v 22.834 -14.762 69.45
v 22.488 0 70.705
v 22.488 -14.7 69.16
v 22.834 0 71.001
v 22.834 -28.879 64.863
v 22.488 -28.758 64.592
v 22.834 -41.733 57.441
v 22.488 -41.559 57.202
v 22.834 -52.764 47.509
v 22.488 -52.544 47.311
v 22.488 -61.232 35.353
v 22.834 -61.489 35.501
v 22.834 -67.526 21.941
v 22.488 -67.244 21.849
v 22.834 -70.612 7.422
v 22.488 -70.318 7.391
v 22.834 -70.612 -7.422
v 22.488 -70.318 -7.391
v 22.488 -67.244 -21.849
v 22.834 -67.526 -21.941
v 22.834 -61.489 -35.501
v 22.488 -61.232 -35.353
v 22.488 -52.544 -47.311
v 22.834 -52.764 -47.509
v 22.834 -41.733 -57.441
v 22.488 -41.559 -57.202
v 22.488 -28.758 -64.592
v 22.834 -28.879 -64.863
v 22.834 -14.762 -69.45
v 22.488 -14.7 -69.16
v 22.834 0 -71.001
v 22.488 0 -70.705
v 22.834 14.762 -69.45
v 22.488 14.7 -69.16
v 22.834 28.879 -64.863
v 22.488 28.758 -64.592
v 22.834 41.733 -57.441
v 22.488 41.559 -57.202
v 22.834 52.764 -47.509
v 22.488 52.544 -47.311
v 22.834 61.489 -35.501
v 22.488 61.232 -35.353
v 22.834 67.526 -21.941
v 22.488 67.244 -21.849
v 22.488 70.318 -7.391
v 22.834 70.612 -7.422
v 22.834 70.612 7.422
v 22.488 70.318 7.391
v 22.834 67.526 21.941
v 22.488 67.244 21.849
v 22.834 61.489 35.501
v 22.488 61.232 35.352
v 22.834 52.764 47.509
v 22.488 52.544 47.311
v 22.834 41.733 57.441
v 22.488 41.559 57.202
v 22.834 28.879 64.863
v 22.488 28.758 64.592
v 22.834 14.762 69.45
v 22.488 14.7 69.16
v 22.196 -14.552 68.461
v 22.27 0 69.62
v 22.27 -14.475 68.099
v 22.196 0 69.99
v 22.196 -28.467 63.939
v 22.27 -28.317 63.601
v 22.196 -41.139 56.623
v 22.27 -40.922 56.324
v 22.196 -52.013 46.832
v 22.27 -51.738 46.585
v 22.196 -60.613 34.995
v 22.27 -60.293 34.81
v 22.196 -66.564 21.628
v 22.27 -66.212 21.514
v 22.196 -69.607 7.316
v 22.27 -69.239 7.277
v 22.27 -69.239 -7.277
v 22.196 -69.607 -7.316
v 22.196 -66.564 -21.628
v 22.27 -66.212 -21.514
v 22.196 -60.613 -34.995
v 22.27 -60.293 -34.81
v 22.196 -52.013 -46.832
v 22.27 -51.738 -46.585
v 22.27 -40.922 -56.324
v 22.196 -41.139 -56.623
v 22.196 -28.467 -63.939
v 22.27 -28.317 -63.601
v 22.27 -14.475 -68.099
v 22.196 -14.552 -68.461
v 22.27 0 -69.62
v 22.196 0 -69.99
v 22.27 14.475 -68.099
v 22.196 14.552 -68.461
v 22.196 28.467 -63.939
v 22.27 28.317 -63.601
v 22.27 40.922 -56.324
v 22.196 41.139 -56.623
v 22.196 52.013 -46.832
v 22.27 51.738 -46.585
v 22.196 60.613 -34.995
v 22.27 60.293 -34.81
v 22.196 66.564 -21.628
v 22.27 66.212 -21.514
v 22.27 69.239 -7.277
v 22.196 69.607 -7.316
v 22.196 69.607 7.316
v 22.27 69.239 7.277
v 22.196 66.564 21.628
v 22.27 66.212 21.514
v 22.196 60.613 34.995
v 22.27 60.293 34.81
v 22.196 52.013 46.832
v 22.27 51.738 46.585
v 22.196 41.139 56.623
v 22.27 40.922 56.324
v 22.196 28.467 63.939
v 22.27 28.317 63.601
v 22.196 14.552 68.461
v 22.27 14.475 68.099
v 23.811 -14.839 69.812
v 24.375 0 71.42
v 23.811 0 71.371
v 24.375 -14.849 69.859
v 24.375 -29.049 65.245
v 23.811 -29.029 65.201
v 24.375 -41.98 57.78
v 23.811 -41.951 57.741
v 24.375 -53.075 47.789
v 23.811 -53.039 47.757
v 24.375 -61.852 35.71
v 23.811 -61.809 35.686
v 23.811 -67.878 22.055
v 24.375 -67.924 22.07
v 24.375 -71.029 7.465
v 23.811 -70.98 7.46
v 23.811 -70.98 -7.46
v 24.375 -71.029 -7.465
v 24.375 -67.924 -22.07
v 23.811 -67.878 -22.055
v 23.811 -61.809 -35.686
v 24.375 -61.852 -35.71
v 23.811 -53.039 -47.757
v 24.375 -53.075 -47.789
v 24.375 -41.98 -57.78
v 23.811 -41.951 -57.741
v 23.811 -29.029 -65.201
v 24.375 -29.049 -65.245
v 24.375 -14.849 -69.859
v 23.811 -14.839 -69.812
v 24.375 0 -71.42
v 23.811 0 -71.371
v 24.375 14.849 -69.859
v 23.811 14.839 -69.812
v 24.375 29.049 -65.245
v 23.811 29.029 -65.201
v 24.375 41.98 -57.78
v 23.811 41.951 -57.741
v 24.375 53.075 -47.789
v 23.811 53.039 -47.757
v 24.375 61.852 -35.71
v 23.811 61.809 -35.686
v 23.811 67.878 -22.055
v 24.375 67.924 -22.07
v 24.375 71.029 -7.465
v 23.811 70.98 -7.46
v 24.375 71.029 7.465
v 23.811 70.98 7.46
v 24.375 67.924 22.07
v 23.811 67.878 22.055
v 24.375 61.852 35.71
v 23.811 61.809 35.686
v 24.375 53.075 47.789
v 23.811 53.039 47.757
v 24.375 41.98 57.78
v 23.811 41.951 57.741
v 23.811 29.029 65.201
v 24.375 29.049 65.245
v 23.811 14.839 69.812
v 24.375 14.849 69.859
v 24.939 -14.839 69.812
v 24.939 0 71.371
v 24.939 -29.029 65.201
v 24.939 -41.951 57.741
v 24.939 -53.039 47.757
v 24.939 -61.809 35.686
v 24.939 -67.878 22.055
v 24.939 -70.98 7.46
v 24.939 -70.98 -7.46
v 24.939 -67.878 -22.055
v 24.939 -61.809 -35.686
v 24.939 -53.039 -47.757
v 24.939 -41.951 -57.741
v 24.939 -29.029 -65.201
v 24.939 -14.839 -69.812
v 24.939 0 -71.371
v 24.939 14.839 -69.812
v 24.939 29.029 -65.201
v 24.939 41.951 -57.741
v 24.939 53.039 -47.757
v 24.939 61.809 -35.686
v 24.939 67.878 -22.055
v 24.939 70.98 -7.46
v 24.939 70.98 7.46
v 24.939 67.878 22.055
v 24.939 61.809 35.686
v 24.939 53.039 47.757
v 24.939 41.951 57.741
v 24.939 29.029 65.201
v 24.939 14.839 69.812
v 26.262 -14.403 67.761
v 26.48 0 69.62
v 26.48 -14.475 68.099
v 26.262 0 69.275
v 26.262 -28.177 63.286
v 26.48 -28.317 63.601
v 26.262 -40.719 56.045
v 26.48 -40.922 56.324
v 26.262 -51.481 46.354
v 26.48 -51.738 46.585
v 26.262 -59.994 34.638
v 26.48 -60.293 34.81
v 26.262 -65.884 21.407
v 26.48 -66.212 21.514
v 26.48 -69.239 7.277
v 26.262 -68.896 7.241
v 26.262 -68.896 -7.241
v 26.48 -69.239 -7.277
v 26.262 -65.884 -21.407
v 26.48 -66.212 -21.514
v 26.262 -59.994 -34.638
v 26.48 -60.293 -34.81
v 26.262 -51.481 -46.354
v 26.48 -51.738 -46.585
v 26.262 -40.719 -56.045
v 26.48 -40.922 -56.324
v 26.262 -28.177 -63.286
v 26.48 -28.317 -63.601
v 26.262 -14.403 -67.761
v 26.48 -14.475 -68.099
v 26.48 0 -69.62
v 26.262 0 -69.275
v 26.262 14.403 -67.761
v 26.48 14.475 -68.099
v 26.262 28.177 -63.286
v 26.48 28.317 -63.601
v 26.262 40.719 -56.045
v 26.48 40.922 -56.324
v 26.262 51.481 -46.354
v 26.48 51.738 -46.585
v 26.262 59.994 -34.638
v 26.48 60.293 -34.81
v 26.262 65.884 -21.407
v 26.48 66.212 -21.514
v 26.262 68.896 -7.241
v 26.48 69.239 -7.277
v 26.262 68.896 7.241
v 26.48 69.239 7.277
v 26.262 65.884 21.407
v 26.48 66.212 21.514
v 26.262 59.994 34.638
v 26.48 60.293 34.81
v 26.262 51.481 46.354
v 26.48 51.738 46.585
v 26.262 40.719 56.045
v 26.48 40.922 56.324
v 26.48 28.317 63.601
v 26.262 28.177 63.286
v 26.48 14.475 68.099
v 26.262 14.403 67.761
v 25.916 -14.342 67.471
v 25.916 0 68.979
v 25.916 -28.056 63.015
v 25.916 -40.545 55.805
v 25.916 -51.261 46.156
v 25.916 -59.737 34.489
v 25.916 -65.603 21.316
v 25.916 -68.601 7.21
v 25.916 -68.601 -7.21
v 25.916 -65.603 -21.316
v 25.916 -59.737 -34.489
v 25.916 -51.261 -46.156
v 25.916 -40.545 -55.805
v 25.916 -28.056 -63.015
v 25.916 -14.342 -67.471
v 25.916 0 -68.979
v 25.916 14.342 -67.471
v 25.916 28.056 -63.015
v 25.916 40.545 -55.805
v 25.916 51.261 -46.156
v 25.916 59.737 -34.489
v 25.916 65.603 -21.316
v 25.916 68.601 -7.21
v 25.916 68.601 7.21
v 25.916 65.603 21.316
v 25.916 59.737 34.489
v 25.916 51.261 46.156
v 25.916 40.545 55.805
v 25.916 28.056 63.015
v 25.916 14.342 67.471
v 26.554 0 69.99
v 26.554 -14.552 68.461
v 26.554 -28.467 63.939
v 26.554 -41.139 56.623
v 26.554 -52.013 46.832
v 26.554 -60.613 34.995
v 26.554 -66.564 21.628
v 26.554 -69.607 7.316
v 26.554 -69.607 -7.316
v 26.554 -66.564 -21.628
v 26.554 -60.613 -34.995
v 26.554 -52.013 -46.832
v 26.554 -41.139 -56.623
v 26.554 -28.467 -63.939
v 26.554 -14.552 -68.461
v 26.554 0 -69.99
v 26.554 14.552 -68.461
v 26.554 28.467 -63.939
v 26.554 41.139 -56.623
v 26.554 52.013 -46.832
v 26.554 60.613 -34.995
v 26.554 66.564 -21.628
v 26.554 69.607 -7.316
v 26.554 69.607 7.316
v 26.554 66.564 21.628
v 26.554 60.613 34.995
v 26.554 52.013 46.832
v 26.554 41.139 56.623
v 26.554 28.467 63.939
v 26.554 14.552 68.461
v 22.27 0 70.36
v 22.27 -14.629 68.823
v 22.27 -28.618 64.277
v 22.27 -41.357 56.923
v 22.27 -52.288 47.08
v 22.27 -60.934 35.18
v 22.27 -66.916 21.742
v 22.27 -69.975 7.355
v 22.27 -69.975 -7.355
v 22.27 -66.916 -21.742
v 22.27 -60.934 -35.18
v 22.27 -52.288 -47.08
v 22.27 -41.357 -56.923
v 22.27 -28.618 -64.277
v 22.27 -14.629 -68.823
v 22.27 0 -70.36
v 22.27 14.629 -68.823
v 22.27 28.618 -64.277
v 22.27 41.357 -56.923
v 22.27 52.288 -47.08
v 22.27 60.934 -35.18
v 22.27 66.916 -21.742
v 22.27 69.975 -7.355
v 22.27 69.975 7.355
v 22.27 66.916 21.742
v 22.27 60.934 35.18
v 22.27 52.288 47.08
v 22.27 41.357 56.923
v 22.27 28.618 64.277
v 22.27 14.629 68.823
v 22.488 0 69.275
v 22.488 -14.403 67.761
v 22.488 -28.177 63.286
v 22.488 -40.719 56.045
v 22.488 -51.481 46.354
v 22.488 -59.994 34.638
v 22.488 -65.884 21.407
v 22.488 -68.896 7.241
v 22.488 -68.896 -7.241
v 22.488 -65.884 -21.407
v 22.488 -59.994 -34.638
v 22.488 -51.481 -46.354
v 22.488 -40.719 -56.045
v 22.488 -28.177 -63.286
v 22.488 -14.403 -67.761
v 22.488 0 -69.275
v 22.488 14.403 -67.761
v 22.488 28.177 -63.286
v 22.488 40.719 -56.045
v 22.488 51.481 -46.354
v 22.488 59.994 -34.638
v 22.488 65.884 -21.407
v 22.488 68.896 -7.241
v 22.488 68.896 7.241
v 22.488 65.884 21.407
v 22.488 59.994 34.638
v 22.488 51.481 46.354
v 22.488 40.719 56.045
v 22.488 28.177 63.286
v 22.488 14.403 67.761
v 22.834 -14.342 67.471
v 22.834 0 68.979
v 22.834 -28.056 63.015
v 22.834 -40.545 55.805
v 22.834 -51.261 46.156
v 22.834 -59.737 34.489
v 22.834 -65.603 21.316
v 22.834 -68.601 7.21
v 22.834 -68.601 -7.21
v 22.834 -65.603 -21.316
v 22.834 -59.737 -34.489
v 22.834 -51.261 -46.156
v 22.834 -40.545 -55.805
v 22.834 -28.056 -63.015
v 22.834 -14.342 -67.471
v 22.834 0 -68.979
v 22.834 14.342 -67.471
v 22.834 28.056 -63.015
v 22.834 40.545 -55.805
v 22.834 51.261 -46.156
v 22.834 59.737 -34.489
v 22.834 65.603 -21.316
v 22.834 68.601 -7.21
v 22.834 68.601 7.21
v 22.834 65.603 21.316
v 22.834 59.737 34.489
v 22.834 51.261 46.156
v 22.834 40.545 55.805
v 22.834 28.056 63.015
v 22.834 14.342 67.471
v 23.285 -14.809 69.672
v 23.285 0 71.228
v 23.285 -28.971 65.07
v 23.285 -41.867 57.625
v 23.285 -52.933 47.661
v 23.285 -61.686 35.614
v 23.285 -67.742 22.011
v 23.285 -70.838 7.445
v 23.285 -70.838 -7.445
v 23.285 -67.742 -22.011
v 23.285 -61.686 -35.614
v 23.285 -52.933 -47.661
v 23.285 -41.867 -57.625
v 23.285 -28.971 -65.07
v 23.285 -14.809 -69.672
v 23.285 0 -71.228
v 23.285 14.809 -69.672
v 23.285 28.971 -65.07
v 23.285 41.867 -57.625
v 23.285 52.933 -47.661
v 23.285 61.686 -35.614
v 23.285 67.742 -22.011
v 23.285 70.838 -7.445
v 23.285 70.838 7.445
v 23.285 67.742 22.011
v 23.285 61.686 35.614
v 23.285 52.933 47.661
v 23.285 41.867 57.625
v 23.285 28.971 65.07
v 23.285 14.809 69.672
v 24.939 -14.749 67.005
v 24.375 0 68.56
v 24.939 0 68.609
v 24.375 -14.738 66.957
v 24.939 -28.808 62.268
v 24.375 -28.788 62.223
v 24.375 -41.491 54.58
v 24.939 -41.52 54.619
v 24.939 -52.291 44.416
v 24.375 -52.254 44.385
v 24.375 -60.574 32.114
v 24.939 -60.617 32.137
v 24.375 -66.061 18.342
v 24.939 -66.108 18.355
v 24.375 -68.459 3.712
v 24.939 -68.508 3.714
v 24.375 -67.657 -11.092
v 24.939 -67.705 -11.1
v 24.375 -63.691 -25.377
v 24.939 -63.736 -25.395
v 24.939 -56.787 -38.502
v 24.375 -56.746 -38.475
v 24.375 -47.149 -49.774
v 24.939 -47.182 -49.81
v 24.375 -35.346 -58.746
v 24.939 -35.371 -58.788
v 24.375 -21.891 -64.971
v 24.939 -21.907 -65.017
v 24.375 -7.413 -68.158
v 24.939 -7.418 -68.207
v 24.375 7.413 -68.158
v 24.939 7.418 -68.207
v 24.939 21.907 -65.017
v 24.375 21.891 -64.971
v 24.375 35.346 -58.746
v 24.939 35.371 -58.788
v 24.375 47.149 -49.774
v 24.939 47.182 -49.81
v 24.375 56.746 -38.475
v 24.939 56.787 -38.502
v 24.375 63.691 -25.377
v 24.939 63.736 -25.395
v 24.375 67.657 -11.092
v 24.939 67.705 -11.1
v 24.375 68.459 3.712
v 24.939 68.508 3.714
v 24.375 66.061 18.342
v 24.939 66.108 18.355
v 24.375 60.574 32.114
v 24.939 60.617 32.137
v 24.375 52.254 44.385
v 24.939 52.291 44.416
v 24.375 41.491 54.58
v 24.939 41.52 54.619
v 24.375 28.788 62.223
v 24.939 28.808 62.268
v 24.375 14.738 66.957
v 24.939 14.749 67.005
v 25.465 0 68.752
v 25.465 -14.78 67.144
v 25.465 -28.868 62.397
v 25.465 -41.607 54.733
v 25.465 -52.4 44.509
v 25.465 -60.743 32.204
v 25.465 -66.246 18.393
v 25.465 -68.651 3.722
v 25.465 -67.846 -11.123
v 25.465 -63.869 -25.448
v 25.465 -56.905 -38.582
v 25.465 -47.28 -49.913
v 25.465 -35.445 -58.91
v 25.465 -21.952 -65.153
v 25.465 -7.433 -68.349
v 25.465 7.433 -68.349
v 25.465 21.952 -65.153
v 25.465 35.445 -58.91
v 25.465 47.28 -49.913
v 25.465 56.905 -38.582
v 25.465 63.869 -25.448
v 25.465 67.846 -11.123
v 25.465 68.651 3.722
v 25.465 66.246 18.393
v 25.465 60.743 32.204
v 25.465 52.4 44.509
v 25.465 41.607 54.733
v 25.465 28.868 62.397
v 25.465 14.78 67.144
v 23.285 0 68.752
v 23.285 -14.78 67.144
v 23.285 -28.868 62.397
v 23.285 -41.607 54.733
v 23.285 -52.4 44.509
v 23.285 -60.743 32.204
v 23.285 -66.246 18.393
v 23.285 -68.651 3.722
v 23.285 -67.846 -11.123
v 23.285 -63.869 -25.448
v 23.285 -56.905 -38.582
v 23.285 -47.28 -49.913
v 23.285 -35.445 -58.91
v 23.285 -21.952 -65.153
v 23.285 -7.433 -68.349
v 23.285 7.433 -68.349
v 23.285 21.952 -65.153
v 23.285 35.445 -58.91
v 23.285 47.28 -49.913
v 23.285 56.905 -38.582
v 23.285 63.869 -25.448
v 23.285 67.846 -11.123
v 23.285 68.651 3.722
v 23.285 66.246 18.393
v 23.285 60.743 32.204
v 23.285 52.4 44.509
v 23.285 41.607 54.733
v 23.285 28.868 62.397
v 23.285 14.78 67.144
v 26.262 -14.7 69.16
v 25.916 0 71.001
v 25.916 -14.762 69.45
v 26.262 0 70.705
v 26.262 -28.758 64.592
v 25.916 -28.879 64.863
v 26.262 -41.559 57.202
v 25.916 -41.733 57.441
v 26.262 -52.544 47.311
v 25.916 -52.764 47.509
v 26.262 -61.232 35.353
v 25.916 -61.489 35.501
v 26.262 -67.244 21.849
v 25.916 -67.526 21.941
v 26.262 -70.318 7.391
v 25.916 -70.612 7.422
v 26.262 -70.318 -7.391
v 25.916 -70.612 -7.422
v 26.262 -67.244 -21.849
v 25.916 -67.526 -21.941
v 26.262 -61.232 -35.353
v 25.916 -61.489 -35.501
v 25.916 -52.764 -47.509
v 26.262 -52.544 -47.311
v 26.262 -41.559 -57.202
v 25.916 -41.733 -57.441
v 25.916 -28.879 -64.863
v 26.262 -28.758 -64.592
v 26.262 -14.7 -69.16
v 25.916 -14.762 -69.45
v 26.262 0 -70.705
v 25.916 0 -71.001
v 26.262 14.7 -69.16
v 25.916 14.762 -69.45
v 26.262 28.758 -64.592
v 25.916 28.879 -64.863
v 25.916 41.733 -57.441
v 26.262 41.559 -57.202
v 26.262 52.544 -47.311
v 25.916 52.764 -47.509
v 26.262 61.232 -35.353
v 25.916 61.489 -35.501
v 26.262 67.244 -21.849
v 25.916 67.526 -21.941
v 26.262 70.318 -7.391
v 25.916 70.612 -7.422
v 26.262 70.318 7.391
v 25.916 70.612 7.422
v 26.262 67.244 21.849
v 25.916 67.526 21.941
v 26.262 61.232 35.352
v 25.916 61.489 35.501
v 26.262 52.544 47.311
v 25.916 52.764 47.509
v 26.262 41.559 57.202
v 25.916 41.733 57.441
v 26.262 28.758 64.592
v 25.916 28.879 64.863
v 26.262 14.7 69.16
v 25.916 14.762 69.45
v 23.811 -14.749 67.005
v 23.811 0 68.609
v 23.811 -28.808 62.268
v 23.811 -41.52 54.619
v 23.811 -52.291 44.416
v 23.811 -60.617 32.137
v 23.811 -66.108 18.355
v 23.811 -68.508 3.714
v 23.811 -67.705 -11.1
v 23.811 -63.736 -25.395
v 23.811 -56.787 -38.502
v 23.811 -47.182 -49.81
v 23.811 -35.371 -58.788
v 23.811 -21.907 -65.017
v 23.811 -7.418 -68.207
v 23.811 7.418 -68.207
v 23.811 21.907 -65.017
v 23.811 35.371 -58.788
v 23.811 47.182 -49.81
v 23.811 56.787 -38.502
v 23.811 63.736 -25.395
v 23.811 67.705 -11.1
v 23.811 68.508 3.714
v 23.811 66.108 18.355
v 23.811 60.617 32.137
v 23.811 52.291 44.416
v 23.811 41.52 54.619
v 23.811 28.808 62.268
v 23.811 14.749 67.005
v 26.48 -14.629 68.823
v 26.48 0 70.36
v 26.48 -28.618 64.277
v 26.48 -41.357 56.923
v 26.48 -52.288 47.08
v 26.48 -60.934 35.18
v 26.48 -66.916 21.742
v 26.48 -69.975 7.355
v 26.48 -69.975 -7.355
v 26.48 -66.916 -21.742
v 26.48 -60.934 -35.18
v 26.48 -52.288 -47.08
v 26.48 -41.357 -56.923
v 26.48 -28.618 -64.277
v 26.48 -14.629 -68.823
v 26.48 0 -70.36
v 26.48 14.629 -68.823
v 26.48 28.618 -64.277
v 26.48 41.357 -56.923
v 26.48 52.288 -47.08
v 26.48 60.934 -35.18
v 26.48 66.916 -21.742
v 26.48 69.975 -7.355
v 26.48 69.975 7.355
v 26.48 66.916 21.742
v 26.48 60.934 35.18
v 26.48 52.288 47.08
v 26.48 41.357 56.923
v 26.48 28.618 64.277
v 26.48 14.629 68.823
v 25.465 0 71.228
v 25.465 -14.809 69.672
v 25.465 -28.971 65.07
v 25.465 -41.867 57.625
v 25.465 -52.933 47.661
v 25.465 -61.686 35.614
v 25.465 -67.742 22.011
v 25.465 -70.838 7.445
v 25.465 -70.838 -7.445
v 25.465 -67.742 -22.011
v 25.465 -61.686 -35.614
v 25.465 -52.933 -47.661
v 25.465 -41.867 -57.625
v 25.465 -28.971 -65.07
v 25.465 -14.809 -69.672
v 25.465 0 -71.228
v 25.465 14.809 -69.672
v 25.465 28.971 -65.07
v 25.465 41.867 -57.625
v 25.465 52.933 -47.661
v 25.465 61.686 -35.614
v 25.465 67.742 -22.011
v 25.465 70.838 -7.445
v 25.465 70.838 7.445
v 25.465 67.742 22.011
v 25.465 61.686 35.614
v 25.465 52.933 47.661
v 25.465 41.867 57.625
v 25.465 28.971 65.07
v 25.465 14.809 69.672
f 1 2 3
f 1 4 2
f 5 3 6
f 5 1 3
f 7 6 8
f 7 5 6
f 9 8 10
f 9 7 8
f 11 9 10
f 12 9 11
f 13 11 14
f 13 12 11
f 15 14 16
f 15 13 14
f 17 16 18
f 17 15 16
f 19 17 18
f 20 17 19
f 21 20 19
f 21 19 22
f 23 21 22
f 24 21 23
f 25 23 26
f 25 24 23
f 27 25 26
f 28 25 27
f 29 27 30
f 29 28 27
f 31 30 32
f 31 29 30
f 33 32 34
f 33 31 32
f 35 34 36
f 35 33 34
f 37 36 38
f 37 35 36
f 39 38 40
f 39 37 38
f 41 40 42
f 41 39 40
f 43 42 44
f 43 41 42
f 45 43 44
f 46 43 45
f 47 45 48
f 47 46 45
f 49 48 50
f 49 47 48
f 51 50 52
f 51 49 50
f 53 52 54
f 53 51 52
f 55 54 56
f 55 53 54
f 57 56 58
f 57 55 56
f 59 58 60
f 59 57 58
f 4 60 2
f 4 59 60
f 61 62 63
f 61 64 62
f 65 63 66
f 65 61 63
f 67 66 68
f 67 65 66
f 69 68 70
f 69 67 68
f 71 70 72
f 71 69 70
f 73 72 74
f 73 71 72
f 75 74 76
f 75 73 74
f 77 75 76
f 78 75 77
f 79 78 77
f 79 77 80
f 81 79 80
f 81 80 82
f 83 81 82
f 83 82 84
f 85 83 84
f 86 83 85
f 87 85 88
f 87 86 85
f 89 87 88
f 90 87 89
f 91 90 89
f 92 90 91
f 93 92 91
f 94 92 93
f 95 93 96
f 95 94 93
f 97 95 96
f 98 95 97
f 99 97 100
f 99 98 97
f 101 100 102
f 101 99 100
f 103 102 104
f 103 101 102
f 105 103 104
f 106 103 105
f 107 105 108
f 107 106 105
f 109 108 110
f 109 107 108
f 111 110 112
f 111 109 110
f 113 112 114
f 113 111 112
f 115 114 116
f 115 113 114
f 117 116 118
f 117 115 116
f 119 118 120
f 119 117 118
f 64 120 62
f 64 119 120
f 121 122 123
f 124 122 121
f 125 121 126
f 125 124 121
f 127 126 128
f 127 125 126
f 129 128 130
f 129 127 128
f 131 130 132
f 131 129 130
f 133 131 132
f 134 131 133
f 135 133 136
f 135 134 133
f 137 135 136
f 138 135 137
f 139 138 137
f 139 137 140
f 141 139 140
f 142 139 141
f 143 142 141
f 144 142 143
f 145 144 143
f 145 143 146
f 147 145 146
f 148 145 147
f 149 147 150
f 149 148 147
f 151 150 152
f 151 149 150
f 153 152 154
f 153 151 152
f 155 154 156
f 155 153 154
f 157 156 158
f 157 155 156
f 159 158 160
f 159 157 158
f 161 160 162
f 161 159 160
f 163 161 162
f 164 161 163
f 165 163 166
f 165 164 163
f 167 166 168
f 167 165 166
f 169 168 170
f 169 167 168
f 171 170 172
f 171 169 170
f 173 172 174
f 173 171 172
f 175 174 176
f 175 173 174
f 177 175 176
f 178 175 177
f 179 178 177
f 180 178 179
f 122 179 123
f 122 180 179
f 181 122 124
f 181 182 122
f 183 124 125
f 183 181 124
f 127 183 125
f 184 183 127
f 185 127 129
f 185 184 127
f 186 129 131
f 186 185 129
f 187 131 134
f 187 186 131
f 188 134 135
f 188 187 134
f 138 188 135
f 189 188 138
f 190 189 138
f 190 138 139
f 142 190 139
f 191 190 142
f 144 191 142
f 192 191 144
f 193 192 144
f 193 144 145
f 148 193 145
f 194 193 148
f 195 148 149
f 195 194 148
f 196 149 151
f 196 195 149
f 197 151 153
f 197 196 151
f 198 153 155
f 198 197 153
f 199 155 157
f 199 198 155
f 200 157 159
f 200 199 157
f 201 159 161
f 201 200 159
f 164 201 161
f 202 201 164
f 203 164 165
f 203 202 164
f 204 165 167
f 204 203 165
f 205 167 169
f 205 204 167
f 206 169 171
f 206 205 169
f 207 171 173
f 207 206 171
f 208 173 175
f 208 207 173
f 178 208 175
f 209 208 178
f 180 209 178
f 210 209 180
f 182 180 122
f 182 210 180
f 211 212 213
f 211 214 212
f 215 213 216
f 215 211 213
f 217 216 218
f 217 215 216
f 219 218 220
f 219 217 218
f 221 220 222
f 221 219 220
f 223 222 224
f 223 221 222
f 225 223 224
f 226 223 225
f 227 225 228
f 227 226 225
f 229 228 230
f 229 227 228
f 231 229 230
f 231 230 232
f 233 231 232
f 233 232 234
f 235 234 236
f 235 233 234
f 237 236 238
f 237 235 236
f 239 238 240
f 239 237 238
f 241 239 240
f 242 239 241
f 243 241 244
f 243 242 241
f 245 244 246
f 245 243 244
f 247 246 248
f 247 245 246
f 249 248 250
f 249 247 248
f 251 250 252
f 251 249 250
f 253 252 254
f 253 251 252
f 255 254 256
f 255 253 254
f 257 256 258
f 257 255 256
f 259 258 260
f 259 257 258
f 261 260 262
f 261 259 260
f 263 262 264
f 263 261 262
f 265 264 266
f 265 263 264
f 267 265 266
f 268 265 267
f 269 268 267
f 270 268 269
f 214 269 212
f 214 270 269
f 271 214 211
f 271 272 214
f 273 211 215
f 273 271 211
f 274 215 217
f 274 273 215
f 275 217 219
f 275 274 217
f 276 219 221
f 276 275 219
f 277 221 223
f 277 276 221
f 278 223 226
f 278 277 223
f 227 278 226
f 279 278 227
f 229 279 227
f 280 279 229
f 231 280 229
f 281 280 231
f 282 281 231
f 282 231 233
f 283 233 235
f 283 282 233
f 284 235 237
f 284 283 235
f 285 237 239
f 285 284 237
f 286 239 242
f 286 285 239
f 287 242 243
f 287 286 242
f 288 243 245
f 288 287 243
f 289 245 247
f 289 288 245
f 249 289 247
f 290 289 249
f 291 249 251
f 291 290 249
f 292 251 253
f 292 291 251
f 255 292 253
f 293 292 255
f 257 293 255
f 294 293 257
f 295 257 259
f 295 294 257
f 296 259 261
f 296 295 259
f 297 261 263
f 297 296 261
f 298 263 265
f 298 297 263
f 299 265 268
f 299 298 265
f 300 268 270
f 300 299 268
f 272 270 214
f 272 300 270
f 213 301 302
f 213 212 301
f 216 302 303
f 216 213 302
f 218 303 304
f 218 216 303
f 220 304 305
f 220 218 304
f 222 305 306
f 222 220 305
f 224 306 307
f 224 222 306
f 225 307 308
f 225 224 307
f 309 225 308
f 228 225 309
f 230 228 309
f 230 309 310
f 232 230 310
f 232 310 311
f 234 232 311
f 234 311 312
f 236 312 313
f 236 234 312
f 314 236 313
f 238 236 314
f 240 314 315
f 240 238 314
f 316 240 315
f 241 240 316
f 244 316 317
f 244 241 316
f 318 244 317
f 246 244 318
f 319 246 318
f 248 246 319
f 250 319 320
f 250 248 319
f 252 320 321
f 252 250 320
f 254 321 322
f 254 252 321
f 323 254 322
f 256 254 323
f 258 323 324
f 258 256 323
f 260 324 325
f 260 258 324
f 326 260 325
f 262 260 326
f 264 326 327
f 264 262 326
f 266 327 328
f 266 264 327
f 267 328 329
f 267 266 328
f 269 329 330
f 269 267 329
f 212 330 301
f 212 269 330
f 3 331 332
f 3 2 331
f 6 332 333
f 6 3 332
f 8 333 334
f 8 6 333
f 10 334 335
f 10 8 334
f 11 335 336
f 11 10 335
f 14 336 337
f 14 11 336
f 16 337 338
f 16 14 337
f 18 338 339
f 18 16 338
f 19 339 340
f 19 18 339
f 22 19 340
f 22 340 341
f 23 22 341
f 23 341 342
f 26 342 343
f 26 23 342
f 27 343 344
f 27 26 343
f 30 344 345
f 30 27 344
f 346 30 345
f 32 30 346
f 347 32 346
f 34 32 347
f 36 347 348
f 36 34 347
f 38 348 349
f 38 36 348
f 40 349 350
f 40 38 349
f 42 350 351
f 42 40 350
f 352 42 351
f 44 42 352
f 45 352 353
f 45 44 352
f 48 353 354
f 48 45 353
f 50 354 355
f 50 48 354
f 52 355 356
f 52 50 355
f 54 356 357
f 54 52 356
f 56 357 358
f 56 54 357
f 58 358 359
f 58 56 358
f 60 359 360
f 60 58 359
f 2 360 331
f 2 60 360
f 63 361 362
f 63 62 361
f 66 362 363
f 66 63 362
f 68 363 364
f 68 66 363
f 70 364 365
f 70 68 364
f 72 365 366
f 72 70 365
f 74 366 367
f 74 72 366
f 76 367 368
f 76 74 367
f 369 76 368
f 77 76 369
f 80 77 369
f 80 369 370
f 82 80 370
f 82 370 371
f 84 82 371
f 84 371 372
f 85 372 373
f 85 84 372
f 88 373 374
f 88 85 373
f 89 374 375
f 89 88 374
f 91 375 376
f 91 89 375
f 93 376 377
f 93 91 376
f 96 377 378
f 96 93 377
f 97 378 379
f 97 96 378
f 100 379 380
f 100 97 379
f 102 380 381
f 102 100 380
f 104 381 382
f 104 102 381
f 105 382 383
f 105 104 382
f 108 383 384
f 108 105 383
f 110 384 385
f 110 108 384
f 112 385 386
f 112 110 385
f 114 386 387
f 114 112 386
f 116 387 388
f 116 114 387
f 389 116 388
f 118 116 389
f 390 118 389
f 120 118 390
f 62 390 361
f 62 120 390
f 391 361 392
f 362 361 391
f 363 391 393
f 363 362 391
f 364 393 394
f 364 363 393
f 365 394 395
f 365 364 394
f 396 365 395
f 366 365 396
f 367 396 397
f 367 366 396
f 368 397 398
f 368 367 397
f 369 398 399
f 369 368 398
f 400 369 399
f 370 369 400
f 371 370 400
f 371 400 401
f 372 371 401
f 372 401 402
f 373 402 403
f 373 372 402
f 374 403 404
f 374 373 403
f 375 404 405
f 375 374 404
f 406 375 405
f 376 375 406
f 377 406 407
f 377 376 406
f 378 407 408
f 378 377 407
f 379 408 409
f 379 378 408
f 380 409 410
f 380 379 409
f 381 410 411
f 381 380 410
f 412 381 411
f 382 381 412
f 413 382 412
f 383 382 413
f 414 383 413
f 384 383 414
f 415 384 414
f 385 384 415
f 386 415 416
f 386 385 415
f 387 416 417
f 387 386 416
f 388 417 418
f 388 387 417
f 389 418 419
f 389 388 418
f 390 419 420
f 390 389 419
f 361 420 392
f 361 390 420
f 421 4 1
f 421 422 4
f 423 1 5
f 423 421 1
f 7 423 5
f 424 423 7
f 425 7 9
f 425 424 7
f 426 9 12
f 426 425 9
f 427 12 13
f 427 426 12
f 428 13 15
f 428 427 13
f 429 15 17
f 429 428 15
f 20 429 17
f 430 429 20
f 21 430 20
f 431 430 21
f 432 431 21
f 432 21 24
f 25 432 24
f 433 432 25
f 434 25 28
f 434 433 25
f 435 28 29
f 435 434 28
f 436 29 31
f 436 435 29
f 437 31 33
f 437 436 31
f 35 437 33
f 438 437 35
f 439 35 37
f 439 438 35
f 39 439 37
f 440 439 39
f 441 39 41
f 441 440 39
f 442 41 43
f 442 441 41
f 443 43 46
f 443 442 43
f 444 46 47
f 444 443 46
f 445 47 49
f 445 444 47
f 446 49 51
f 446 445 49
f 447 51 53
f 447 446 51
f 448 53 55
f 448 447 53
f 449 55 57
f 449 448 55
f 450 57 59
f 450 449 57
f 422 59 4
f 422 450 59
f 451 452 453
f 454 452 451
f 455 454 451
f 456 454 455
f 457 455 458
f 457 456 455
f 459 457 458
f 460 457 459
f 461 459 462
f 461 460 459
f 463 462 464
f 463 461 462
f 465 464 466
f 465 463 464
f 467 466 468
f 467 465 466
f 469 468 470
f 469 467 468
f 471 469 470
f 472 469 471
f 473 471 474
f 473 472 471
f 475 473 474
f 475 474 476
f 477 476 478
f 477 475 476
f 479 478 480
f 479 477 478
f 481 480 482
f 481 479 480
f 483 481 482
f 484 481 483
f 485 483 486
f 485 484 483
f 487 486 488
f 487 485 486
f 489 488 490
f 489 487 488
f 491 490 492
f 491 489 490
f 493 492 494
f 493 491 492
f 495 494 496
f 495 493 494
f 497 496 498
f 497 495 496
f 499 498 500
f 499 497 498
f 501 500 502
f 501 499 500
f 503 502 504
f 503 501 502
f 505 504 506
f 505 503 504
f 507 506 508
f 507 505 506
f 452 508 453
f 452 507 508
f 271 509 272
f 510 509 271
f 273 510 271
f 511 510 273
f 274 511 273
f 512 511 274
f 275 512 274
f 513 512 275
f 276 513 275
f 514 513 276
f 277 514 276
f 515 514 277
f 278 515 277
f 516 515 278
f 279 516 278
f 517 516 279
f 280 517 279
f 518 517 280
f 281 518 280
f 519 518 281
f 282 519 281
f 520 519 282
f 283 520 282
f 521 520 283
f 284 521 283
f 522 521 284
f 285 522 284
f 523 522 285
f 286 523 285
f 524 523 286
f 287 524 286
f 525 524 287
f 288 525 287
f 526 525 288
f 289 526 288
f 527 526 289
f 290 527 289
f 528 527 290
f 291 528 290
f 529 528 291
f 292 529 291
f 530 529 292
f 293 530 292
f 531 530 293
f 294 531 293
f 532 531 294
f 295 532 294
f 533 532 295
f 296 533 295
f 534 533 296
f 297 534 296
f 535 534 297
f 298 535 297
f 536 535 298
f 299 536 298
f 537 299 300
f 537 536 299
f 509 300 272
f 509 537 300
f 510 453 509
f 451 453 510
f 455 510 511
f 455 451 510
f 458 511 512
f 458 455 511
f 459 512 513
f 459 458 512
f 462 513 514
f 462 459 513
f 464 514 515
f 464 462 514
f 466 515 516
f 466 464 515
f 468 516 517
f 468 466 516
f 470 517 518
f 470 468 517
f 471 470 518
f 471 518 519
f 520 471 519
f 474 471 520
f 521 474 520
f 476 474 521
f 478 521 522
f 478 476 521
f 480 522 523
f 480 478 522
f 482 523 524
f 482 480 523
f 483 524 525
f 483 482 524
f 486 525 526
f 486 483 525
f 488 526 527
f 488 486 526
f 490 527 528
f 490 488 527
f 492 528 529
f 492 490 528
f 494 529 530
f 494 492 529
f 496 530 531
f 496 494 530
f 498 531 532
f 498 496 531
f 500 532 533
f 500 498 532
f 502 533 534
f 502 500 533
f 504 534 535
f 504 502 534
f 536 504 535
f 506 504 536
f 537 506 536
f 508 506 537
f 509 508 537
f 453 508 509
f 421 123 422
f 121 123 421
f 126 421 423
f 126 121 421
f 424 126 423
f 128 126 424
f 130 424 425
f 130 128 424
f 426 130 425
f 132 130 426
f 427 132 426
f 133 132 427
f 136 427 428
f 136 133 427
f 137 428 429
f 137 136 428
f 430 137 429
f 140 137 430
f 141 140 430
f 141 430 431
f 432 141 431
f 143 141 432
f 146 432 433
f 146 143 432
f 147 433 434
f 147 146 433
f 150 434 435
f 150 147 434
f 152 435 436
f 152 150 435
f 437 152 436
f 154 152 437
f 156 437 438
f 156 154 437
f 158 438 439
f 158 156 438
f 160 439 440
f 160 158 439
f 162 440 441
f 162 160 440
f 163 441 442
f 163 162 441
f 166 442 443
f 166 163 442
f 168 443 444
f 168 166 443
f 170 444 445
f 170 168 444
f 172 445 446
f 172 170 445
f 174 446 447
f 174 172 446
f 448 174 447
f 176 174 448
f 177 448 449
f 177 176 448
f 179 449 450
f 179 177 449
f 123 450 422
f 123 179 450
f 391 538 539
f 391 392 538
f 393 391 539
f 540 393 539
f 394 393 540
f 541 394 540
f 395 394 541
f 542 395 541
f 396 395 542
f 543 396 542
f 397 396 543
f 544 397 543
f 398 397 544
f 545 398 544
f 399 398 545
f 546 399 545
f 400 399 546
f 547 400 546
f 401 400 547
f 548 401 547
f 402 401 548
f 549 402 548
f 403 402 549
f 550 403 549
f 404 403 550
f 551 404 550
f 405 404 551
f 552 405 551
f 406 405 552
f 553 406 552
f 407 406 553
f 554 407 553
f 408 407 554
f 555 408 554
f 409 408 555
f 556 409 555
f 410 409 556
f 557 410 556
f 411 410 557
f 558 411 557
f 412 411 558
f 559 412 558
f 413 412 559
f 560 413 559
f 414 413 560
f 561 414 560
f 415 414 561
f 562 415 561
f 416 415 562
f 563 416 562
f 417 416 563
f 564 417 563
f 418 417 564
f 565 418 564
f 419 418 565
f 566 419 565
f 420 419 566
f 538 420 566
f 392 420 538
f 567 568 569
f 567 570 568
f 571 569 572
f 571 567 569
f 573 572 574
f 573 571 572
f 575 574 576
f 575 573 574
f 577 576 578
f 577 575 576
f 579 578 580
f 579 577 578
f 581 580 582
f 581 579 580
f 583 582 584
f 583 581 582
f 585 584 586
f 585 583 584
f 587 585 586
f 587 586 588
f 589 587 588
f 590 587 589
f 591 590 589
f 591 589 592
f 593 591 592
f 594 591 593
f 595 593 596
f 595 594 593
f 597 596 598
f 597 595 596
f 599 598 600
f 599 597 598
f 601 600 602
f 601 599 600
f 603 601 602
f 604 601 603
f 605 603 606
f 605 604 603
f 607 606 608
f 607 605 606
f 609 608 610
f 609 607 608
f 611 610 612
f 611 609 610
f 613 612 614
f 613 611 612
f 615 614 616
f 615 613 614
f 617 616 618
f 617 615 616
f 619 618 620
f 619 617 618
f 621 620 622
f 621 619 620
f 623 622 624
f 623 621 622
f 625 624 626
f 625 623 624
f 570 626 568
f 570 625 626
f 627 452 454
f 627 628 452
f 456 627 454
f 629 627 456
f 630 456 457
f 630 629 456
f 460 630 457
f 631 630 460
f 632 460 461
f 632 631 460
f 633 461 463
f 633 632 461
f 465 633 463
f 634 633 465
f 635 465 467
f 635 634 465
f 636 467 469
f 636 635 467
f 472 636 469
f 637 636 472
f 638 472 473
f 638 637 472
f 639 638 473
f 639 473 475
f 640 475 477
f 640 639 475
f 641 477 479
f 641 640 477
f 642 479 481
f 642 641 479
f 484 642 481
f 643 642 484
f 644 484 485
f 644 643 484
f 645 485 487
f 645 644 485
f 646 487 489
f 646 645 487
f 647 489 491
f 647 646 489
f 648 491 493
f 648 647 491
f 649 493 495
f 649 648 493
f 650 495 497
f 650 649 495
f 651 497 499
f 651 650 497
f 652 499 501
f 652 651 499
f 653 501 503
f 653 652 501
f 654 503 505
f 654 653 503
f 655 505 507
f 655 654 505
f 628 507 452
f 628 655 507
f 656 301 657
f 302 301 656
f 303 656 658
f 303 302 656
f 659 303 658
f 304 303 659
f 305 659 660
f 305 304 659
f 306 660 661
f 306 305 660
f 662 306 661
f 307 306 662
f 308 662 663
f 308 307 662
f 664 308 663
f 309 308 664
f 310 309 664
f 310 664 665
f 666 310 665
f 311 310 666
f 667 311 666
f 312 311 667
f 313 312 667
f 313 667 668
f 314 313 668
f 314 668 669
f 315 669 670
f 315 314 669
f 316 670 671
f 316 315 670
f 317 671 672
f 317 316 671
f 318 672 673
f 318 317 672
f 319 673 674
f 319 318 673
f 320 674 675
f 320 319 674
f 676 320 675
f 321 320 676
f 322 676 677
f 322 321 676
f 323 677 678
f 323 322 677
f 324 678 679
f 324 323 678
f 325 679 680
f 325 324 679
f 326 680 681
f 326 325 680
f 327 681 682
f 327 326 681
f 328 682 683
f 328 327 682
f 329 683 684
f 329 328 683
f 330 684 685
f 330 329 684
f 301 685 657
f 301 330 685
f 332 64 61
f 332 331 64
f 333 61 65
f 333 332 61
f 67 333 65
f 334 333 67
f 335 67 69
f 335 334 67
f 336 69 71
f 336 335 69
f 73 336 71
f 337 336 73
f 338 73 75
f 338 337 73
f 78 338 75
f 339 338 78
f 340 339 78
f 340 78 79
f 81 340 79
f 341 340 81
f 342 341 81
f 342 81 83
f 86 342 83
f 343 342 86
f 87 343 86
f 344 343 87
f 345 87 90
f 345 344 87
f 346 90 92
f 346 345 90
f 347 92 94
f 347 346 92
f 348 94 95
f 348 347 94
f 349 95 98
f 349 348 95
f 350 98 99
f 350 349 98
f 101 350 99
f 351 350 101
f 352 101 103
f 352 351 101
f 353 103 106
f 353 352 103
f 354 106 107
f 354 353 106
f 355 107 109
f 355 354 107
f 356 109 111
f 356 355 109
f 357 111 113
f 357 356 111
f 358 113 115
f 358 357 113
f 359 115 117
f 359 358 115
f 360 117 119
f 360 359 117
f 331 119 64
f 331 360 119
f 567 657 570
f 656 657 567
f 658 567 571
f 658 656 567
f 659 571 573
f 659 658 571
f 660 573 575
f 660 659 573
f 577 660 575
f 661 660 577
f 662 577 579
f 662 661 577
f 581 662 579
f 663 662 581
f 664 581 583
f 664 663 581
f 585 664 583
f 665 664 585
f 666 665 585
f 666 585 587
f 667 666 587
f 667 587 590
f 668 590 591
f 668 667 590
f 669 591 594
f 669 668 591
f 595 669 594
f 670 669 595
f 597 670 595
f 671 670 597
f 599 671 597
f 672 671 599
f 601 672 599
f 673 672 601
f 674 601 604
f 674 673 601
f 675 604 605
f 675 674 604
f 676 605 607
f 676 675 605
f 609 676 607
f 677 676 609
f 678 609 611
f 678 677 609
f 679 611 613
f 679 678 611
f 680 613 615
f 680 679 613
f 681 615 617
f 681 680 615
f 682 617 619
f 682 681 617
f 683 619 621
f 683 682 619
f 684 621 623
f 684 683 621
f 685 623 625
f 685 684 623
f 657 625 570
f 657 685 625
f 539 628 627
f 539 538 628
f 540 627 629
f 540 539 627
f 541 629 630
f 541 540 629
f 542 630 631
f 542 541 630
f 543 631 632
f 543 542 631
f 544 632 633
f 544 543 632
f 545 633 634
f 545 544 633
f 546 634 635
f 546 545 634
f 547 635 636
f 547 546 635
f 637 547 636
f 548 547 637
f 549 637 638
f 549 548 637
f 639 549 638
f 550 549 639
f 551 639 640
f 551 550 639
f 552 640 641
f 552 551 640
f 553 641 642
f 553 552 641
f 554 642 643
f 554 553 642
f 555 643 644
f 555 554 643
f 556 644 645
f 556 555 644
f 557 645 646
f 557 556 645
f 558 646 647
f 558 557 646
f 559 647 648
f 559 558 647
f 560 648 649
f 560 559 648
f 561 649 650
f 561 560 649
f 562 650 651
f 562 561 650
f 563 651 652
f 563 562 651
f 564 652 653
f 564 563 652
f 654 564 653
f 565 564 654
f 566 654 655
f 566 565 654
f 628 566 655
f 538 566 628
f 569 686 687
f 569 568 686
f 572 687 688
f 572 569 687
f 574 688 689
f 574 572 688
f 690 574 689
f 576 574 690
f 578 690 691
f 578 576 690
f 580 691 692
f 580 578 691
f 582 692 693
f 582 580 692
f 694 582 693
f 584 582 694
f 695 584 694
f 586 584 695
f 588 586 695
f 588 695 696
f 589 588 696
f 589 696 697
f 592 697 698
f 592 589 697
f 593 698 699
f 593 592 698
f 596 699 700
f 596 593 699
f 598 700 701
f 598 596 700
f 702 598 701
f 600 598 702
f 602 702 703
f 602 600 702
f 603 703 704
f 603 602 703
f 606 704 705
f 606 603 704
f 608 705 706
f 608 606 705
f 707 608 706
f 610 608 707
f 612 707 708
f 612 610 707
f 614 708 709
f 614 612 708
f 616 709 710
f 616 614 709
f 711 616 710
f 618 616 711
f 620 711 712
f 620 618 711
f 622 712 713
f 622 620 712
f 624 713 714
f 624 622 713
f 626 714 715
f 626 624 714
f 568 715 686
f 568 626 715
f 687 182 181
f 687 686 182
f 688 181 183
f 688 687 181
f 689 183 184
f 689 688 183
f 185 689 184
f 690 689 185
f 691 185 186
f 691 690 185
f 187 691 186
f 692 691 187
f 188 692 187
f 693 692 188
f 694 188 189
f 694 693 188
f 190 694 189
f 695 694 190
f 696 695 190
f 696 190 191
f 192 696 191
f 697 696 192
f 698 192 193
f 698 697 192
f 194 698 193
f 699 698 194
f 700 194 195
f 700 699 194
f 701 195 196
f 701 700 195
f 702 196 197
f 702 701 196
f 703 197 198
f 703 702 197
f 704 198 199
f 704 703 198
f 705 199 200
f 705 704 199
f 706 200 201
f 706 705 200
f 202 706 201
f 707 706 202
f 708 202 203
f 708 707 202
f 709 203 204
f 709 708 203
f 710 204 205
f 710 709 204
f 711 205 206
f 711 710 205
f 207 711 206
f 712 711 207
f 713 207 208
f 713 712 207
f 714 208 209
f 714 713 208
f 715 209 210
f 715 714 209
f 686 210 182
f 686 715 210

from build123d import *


with BuildPart() as part:
    # Tank_O_Ring Sketch → Tank_O_Ring (revolve)
    with BuildSketch(Plane.XY):
        Polygon((24.375, 71.42), (24.939023547, 71.371273932), (25.464609822, 71.228416327), (25.915940988, 71.001162697), (26.262259572, 70.705), (26.479964535, 70.360111234), (26.554219643, 69.99), (26.479964535, 69.619888766), (26.262259572, 69.275), (25.915940988, 68.978837303), (25.464609822, 68.751583673), (24.939023547, 68.608726068), (24.375, 68.56), (23.810976453, 68.608726068), (23.285390178, 68.751583673), (22.834059012, 68.978837303), (22.487740428, 69.275), (22.270035465, 69.619888766), (22.195780357, 69.99), (22.270035465, 70.360111234), (22.487740428, 70.705), (22.834059012, 71.001162697), (23.285390178, 71.228416327), (23.810976453, 71.371273932), align=None)
    revolve(axis=Axis((-1000, 0, 0), (1, 0, 0)))


solid = part.part
